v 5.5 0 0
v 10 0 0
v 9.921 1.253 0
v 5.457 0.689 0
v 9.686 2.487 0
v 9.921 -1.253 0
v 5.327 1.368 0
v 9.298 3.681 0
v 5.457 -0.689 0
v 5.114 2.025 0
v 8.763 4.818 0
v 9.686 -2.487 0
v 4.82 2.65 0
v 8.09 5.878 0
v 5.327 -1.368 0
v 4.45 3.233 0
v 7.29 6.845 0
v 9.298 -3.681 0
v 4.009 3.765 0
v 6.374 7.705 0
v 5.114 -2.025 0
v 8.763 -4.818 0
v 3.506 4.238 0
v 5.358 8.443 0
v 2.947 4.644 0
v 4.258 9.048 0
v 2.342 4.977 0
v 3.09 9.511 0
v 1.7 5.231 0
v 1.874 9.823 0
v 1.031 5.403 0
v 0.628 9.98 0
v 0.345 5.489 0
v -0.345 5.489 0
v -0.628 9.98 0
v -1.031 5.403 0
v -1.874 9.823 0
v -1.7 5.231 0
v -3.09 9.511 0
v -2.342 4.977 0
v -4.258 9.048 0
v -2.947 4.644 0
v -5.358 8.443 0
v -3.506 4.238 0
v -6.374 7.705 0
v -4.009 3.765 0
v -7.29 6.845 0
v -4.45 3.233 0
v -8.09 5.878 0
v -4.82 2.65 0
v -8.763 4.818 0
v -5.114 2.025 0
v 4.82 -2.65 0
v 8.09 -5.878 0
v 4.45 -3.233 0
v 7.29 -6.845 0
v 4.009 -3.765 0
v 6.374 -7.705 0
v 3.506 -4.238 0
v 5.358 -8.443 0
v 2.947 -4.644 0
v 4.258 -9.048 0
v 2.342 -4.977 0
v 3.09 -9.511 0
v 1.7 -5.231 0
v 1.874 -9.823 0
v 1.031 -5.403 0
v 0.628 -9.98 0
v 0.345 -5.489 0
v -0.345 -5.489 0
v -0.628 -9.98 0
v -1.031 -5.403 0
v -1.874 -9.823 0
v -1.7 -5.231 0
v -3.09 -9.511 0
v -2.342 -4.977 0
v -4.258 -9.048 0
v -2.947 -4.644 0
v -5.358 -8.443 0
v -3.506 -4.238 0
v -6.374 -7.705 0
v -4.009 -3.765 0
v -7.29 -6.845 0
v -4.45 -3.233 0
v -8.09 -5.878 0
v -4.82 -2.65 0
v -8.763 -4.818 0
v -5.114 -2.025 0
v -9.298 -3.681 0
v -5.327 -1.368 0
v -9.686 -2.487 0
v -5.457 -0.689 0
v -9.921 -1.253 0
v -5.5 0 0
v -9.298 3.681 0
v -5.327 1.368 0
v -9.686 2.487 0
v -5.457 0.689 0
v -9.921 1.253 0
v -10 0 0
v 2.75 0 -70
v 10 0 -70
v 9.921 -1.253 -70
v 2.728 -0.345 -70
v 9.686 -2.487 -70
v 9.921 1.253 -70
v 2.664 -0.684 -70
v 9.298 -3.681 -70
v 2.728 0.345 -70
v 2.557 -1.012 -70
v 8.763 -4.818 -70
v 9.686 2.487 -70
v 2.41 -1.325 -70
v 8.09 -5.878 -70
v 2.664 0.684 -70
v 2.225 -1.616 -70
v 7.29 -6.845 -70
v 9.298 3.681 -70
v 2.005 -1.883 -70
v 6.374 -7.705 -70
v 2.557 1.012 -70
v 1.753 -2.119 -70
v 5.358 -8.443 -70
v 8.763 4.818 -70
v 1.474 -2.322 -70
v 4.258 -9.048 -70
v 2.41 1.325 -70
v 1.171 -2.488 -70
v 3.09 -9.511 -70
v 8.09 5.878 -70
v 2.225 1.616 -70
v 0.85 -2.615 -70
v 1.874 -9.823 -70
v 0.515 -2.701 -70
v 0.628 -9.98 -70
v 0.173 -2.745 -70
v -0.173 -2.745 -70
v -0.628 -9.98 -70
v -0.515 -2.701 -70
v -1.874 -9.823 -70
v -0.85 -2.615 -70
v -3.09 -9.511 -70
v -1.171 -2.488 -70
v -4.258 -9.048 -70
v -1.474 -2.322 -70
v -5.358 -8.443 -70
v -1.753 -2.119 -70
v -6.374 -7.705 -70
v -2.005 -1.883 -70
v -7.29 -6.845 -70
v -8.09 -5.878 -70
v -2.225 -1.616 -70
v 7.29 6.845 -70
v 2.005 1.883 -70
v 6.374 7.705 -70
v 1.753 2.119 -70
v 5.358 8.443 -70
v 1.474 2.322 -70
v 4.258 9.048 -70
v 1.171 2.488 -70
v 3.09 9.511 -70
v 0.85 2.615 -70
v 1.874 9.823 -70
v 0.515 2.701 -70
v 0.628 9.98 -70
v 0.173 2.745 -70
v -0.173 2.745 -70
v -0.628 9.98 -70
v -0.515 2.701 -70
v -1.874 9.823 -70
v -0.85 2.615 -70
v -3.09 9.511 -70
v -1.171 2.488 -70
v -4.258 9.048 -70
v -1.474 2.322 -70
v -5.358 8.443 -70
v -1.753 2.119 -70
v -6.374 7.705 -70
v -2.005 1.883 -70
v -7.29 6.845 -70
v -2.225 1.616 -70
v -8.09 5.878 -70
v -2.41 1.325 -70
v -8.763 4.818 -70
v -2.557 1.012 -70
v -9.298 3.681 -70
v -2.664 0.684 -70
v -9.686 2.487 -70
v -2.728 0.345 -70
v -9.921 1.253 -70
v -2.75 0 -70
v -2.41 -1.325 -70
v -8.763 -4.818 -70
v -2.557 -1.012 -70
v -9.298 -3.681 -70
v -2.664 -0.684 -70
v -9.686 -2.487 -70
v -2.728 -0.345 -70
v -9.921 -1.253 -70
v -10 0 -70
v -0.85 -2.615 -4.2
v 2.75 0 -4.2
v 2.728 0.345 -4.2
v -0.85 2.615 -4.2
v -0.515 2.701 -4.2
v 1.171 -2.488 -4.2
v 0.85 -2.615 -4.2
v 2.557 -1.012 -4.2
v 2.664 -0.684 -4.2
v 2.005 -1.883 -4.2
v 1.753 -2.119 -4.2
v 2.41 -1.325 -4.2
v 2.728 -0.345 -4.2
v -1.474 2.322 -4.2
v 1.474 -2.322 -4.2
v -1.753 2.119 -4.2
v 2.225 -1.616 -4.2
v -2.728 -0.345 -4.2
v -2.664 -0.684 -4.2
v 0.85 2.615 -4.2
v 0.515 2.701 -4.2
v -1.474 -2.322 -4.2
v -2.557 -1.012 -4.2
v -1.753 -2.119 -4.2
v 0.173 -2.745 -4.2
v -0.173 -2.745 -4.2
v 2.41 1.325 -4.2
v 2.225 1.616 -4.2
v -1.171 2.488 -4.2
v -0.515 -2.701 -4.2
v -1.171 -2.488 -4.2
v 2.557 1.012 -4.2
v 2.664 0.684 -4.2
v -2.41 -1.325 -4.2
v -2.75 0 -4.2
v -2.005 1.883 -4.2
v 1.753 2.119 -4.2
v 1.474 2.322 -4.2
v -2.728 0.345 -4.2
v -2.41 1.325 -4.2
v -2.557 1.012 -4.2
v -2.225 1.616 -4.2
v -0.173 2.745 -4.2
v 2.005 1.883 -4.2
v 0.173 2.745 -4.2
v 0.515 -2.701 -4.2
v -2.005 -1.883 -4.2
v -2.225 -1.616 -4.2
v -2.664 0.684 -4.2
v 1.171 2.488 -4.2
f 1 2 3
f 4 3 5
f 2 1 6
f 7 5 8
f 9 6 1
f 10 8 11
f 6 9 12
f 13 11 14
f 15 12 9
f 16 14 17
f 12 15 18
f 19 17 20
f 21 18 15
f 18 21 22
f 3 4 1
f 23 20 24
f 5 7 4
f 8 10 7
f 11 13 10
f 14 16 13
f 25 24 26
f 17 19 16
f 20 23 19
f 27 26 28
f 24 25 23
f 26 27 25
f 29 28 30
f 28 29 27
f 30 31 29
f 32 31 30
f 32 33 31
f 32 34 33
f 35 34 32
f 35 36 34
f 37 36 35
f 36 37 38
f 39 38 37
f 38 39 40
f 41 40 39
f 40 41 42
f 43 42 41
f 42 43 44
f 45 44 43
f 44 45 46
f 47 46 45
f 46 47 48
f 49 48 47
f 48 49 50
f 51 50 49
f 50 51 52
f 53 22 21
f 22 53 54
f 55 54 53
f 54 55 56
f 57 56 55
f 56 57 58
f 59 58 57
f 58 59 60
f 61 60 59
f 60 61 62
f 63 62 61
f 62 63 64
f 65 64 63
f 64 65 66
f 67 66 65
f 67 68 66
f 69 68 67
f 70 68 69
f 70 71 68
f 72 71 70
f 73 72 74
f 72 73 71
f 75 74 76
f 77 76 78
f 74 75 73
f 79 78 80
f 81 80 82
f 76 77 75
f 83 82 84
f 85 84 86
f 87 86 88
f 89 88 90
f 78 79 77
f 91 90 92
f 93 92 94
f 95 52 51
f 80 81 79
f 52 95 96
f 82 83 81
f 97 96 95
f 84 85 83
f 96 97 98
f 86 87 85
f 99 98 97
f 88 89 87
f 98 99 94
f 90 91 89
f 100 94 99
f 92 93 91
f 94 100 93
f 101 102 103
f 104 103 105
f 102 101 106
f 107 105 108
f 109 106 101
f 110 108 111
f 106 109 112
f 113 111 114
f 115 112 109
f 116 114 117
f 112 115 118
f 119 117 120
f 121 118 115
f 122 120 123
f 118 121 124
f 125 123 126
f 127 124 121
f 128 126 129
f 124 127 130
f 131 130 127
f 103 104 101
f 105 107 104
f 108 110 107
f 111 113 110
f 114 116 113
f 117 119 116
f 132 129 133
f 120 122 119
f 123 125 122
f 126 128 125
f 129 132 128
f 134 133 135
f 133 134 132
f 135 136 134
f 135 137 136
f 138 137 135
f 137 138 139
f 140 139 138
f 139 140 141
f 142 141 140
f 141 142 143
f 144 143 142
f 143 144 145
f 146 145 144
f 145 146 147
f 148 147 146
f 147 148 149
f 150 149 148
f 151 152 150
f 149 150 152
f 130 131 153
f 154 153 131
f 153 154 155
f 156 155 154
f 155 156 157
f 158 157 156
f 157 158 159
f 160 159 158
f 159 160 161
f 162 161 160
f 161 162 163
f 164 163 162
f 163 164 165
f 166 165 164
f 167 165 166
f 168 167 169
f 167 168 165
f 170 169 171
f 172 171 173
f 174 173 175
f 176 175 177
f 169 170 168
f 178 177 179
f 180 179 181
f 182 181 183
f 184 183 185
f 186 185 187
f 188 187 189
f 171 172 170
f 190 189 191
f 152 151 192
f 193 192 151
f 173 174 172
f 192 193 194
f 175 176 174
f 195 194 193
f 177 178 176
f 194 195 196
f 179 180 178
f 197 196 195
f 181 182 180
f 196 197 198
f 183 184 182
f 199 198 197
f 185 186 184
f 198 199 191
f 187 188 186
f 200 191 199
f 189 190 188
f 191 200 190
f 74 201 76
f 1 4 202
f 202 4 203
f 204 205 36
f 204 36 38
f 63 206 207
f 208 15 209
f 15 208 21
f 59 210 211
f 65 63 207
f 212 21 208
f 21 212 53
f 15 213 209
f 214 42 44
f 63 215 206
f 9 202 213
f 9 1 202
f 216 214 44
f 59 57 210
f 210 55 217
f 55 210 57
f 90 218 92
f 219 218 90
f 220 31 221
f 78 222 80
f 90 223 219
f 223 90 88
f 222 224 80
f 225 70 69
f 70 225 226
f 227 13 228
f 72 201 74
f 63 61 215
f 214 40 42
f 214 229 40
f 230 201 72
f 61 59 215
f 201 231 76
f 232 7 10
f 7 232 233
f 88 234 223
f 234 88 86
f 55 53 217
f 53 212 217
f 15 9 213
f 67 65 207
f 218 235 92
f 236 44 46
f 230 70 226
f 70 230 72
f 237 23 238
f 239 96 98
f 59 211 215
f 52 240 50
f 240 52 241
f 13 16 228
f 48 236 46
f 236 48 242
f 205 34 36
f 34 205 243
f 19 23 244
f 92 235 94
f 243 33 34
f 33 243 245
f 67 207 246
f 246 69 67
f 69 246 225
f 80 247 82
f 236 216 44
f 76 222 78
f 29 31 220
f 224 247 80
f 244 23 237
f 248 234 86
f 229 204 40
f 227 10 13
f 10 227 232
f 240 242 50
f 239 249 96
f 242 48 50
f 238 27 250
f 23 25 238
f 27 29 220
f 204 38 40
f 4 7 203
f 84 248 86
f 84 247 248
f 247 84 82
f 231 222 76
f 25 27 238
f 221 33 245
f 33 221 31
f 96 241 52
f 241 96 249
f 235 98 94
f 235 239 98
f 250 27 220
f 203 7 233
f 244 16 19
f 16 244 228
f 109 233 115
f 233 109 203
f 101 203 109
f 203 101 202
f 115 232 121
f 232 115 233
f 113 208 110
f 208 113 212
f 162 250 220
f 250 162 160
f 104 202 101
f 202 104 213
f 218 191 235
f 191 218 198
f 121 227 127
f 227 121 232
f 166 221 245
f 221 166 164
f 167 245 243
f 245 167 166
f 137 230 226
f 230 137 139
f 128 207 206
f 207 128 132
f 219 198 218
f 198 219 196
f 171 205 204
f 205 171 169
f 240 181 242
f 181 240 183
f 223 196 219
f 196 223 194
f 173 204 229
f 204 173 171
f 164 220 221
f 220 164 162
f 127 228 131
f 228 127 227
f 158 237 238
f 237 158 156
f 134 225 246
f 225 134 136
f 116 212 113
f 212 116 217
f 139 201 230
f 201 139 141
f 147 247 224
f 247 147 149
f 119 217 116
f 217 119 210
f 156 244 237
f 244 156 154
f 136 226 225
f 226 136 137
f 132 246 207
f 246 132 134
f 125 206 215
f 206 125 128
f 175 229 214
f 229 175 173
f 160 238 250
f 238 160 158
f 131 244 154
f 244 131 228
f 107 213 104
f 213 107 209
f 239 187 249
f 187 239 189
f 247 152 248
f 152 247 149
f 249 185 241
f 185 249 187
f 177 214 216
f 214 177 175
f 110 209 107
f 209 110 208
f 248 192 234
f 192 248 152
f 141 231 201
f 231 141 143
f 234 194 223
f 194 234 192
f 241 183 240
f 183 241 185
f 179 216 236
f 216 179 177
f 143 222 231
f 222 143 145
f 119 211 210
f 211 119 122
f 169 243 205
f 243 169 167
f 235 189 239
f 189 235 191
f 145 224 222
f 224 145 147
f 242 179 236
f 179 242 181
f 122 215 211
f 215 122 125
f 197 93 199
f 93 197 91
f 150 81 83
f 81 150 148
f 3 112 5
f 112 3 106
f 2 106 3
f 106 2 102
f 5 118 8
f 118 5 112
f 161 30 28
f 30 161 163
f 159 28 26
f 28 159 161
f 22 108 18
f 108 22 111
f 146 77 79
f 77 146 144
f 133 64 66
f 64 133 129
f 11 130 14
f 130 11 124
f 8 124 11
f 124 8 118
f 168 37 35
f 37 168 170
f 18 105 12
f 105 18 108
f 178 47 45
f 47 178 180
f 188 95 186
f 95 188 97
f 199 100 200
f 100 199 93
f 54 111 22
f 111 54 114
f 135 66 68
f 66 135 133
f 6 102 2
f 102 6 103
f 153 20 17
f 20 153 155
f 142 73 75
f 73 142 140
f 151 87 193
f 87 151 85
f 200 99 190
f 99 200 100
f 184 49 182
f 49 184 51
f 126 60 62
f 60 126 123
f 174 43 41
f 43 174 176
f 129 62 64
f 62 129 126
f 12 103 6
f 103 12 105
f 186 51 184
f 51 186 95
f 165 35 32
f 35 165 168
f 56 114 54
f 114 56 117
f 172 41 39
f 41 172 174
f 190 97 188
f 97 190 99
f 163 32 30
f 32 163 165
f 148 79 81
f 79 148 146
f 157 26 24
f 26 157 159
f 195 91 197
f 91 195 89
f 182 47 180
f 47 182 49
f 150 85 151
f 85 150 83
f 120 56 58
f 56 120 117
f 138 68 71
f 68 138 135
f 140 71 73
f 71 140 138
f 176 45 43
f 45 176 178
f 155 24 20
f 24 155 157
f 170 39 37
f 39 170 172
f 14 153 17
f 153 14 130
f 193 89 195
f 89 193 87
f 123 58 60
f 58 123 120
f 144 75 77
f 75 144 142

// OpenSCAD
$fn = 50;


difference() {
	union() {
		translate(v = [0, 0, -70.0000000000]) {
			cylinder(h = 70, r = 10.0000000000);
		}
		cylinder(h = 0, r = 13.0000000000);
	}
	union() {
		translate(v = [0, 0, 0]) {
			rotate(a = [0, 0, 0]) {
				difference() {
					union() {
						#translate(v = [0, 0, -70.0000000000]) {
							cylinder(h = 70, r = 2.2500000000);
						}
						#translate(v = [0, 0, -4.2000000000]) {
							cylinder(h = 4.2000000000, r1 = 2.7500000000, r2 = 5.5000000000);
						}
						#translate(v = [0, 0, -70.0000000000]) {
							cylinder(h = 70, r = 2.7500000000);
						}
						#translate(v = [0, 0, -70.0000000000]) {
							cylinder(h = 70, r = 2.2500000000);
						}
					}
					union();
				}
			}
		}
	}
}
